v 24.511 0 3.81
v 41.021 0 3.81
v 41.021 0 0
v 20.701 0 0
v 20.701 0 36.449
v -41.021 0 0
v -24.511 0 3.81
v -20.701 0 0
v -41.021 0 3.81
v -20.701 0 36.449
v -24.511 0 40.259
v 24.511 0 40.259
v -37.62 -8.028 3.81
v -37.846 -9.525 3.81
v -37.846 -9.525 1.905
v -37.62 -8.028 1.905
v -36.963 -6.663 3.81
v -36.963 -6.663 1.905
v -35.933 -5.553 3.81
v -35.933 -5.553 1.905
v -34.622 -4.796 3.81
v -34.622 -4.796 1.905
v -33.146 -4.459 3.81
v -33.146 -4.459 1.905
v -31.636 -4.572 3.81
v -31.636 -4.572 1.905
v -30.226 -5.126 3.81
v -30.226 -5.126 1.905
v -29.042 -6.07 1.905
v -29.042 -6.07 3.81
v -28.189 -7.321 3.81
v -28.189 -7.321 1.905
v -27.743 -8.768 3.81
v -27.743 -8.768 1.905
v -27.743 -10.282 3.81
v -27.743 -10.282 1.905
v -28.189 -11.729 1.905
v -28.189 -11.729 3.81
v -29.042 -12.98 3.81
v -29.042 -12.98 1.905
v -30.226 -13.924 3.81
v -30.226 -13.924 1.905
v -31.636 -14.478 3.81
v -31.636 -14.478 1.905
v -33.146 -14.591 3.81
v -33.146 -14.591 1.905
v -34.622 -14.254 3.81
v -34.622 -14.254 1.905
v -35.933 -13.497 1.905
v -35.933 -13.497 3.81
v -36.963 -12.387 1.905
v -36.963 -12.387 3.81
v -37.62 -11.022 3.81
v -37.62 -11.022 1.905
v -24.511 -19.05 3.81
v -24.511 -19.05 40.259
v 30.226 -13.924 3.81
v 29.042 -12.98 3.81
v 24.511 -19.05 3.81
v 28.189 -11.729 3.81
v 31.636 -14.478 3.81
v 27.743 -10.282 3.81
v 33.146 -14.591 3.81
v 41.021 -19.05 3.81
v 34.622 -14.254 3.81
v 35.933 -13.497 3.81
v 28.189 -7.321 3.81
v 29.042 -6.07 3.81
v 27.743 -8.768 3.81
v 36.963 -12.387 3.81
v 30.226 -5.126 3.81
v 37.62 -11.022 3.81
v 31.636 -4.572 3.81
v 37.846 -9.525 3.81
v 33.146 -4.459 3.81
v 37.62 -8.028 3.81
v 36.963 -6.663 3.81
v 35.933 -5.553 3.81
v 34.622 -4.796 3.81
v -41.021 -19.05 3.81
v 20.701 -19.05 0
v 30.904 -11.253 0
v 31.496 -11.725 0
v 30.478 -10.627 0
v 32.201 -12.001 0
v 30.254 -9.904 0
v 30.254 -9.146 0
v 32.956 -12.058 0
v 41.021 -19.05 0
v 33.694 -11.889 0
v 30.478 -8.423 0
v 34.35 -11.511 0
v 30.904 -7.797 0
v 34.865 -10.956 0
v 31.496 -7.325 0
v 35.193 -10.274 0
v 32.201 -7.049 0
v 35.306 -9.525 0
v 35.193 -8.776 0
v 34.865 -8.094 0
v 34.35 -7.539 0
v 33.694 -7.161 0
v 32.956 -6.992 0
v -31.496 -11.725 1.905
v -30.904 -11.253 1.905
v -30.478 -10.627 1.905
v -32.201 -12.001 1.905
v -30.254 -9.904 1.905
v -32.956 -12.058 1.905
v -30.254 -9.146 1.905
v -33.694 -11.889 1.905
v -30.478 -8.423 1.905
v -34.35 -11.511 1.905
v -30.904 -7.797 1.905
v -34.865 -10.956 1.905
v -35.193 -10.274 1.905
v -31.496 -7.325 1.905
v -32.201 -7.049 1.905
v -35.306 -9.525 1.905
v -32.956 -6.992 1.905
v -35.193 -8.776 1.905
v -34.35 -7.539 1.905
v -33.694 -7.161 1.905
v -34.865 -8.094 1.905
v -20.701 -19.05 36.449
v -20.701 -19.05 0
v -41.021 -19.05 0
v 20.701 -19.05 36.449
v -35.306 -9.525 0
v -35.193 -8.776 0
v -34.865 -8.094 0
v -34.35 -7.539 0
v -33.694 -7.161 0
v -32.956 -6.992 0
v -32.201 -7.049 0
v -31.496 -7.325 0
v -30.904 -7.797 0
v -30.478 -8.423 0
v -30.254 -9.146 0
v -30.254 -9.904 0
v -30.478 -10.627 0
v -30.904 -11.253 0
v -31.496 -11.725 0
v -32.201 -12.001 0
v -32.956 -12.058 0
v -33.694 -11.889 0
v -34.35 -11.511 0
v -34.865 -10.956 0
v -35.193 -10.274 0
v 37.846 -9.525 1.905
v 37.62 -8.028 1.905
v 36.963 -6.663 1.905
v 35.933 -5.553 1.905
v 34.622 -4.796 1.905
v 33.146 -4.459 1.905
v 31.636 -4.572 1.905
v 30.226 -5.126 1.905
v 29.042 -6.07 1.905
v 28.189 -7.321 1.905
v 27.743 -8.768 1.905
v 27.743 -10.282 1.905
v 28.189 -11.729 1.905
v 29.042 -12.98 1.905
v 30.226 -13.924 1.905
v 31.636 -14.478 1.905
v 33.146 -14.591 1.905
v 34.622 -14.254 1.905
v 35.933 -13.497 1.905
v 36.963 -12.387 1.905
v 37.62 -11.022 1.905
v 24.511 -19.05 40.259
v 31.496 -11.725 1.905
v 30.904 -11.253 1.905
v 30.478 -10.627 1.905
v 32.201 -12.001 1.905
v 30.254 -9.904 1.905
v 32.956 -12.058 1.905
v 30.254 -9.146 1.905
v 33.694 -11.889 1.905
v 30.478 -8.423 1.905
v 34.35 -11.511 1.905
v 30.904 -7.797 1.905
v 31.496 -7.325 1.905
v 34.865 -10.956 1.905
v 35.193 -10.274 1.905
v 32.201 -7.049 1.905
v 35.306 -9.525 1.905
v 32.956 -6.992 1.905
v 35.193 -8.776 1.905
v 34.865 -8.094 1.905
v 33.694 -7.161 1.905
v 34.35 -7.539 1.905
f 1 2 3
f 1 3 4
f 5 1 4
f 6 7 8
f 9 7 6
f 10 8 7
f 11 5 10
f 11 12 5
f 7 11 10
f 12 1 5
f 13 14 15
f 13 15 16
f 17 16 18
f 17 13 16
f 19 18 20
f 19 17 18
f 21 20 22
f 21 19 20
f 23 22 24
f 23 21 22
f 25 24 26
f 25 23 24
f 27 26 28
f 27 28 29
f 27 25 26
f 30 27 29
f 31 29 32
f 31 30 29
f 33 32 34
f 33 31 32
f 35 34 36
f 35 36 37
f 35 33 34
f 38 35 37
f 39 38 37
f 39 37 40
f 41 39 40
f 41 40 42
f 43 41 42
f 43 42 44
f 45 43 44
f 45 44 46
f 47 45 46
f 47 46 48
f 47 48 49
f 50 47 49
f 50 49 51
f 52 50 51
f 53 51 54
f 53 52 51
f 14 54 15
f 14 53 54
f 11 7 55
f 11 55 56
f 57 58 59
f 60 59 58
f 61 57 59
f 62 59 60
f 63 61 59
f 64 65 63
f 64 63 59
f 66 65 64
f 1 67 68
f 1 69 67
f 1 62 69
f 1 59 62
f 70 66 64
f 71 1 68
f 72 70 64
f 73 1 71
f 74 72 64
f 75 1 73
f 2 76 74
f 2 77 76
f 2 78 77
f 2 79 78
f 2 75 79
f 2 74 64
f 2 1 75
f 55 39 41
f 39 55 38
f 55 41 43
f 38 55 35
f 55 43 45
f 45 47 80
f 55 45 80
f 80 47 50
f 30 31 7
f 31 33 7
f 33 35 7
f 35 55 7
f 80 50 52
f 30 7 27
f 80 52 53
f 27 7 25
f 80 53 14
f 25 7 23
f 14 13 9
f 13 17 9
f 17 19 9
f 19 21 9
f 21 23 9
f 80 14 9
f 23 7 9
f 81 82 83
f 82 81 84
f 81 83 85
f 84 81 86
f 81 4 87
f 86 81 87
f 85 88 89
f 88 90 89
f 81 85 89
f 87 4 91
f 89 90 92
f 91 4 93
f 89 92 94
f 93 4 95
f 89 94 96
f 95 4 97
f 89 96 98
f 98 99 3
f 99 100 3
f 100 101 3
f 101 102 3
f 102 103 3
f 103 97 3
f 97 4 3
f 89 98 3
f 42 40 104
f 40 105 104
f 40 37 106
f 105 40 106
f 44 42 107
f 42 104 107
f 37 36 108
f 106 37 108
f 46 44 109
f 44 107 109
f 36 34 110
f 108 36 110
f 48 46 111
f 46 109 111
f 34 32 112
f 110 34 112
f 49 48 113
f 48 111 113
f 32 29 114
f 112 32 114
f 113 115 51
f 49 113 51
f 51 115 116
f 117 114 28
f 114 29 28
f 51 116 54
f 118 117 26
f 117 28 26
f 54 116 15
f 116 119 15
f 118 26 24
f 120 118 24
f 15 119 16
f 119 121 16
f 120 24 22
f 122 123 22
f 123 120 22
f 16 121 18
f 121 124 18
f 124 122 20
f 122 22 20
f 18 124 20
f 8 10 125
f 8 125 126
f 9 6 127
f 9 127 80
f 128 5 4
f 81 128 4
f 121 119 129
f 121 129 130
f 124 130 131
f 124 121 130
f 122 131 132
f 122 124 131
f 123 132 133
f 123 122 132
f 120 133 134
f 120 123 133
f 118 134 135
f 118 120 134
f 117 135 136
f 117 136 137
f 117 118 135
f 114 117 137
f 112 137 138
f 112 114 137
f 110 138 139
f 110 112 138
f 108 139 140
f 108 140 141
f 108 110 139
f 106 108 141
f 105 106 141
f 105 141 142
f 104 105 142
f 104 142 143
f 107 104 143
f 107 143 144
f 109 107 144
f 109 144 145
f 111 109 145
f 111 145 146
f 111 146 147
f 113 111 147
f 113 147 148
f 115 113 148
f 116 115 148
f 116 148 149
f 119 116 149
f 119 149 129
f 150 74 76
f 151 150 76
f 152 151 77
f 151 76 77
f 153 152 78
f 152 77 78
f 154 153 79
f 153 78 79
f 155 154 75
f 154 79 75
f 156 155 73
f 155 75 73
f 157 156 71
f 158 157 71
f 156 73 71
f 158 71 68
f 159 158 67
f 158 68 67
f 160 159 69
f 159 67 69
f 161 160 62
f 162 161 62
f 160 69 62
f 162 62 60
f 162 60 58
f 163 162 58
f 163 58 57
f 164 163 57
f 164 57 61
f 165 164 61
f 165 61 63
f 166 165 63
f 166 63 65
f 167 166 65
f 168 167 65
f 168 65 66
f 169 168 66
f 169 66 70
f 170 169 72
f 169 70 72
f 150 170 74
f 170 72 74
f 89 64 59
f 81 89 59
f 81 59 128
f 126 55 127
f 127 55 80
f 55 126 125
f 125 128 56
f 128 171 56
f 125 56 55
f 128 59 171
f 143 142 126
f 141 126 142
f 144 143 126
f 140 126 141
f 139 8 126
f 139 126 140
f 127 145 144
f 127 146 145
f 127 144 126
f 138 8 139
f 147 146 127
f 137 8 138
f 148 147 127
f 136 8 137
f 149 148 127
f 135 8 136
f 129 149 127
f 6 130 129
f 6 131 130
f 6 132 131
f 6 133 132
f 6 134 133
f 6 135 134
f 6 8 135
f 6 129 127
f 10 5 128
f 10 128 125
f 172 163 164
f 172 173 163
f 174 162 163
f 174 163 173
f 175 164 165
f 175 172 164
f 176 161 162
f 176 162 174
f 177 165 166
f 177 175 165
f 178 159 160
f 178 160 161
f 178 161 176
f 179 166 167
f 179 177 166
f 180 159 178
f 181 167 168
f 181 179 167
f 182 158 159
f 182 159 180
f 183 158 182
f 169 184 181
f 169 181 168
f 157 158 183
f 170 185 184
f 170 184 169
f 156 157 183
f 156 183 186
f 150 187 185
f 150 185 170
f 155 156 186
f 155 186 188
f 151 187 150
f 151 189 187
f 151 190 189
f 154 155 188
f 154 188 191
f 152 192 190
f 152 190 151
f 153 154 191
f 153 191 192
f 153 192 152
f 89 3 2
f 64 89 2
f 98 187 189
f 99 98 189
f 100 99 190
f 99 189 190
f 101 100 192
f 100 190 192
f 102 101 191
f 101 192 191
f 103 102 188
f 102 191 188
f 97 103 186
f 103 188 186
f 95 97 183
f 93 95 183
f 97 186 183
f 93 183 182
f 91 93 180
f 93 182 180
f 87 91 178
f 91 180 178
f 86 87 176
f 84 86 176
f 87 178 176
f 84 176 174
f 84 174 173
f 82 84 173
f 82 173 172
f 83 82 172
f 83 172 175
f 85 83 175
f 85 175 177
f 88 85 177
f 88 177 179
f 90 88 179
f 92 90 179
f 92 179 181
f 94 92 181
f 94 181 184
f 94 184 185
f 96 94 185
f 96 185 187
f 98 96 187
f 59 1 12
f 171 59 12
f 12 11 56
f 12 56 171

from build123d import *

# Parameters (mm, degrees)
F1_W     = 20.701
F1_H     = 3.81
F1_W_2   = 3.81
F1_H_2   = 32.639
F1_W_3   = 16.51
F2_DEPTH = 19.05
F3_R     = 2.54
F4_DEPTH = 3.811
F5_R     = 5.08
F6_DEPTH = 1.905


with BuildPart() as f2:
    # F1 (on Front) → F2 (new body)
    with BuildSketch(Plane.XZ):
        with Locations((10.3505, 38.354)):
            Rectangle(F1_W, F1_H)
        with Locations((22.606, 38.354)):
            Rectangle(F1_W_2, F1_H)
        with Locations((22.606, 20.1295)):
            Rectangle(F1_W_2, F1_H_2)
        with Locations((22.606, 1.905)):
            Rectangle(F1_W_2, F1_H)
        with Locations((32.766, 1.905)):
            Rectangle(F1_W_3, F1_H)
    extrude(amount=F2_DEPTH)

    # F3 (on face) → F4 (cut, through all)
    with BuildSketch(Plane.XY.offset(3.81)):
        with Locations((32.766, -9.525)):
            Circle(F3_R)
    extrude(amount=-F4_DEPTH, mode=Mode.SUBTRACT)

    # F5 (on face) → F6 (cut)
    with BuildSketch(Plane.XY.offset(3.81)):
        with Locations((32.766, -9.525)):
            Circle(F5_R)
    extrude(amount=-F6_DEPTH, mode=Mode.SUBTRACT)

    # F7: F2 across plane


with BuildPart() as f2_1:
    add(f2.part)
    add(f2.part.mirror(Plane.YZ))


solid = f2_1.part
